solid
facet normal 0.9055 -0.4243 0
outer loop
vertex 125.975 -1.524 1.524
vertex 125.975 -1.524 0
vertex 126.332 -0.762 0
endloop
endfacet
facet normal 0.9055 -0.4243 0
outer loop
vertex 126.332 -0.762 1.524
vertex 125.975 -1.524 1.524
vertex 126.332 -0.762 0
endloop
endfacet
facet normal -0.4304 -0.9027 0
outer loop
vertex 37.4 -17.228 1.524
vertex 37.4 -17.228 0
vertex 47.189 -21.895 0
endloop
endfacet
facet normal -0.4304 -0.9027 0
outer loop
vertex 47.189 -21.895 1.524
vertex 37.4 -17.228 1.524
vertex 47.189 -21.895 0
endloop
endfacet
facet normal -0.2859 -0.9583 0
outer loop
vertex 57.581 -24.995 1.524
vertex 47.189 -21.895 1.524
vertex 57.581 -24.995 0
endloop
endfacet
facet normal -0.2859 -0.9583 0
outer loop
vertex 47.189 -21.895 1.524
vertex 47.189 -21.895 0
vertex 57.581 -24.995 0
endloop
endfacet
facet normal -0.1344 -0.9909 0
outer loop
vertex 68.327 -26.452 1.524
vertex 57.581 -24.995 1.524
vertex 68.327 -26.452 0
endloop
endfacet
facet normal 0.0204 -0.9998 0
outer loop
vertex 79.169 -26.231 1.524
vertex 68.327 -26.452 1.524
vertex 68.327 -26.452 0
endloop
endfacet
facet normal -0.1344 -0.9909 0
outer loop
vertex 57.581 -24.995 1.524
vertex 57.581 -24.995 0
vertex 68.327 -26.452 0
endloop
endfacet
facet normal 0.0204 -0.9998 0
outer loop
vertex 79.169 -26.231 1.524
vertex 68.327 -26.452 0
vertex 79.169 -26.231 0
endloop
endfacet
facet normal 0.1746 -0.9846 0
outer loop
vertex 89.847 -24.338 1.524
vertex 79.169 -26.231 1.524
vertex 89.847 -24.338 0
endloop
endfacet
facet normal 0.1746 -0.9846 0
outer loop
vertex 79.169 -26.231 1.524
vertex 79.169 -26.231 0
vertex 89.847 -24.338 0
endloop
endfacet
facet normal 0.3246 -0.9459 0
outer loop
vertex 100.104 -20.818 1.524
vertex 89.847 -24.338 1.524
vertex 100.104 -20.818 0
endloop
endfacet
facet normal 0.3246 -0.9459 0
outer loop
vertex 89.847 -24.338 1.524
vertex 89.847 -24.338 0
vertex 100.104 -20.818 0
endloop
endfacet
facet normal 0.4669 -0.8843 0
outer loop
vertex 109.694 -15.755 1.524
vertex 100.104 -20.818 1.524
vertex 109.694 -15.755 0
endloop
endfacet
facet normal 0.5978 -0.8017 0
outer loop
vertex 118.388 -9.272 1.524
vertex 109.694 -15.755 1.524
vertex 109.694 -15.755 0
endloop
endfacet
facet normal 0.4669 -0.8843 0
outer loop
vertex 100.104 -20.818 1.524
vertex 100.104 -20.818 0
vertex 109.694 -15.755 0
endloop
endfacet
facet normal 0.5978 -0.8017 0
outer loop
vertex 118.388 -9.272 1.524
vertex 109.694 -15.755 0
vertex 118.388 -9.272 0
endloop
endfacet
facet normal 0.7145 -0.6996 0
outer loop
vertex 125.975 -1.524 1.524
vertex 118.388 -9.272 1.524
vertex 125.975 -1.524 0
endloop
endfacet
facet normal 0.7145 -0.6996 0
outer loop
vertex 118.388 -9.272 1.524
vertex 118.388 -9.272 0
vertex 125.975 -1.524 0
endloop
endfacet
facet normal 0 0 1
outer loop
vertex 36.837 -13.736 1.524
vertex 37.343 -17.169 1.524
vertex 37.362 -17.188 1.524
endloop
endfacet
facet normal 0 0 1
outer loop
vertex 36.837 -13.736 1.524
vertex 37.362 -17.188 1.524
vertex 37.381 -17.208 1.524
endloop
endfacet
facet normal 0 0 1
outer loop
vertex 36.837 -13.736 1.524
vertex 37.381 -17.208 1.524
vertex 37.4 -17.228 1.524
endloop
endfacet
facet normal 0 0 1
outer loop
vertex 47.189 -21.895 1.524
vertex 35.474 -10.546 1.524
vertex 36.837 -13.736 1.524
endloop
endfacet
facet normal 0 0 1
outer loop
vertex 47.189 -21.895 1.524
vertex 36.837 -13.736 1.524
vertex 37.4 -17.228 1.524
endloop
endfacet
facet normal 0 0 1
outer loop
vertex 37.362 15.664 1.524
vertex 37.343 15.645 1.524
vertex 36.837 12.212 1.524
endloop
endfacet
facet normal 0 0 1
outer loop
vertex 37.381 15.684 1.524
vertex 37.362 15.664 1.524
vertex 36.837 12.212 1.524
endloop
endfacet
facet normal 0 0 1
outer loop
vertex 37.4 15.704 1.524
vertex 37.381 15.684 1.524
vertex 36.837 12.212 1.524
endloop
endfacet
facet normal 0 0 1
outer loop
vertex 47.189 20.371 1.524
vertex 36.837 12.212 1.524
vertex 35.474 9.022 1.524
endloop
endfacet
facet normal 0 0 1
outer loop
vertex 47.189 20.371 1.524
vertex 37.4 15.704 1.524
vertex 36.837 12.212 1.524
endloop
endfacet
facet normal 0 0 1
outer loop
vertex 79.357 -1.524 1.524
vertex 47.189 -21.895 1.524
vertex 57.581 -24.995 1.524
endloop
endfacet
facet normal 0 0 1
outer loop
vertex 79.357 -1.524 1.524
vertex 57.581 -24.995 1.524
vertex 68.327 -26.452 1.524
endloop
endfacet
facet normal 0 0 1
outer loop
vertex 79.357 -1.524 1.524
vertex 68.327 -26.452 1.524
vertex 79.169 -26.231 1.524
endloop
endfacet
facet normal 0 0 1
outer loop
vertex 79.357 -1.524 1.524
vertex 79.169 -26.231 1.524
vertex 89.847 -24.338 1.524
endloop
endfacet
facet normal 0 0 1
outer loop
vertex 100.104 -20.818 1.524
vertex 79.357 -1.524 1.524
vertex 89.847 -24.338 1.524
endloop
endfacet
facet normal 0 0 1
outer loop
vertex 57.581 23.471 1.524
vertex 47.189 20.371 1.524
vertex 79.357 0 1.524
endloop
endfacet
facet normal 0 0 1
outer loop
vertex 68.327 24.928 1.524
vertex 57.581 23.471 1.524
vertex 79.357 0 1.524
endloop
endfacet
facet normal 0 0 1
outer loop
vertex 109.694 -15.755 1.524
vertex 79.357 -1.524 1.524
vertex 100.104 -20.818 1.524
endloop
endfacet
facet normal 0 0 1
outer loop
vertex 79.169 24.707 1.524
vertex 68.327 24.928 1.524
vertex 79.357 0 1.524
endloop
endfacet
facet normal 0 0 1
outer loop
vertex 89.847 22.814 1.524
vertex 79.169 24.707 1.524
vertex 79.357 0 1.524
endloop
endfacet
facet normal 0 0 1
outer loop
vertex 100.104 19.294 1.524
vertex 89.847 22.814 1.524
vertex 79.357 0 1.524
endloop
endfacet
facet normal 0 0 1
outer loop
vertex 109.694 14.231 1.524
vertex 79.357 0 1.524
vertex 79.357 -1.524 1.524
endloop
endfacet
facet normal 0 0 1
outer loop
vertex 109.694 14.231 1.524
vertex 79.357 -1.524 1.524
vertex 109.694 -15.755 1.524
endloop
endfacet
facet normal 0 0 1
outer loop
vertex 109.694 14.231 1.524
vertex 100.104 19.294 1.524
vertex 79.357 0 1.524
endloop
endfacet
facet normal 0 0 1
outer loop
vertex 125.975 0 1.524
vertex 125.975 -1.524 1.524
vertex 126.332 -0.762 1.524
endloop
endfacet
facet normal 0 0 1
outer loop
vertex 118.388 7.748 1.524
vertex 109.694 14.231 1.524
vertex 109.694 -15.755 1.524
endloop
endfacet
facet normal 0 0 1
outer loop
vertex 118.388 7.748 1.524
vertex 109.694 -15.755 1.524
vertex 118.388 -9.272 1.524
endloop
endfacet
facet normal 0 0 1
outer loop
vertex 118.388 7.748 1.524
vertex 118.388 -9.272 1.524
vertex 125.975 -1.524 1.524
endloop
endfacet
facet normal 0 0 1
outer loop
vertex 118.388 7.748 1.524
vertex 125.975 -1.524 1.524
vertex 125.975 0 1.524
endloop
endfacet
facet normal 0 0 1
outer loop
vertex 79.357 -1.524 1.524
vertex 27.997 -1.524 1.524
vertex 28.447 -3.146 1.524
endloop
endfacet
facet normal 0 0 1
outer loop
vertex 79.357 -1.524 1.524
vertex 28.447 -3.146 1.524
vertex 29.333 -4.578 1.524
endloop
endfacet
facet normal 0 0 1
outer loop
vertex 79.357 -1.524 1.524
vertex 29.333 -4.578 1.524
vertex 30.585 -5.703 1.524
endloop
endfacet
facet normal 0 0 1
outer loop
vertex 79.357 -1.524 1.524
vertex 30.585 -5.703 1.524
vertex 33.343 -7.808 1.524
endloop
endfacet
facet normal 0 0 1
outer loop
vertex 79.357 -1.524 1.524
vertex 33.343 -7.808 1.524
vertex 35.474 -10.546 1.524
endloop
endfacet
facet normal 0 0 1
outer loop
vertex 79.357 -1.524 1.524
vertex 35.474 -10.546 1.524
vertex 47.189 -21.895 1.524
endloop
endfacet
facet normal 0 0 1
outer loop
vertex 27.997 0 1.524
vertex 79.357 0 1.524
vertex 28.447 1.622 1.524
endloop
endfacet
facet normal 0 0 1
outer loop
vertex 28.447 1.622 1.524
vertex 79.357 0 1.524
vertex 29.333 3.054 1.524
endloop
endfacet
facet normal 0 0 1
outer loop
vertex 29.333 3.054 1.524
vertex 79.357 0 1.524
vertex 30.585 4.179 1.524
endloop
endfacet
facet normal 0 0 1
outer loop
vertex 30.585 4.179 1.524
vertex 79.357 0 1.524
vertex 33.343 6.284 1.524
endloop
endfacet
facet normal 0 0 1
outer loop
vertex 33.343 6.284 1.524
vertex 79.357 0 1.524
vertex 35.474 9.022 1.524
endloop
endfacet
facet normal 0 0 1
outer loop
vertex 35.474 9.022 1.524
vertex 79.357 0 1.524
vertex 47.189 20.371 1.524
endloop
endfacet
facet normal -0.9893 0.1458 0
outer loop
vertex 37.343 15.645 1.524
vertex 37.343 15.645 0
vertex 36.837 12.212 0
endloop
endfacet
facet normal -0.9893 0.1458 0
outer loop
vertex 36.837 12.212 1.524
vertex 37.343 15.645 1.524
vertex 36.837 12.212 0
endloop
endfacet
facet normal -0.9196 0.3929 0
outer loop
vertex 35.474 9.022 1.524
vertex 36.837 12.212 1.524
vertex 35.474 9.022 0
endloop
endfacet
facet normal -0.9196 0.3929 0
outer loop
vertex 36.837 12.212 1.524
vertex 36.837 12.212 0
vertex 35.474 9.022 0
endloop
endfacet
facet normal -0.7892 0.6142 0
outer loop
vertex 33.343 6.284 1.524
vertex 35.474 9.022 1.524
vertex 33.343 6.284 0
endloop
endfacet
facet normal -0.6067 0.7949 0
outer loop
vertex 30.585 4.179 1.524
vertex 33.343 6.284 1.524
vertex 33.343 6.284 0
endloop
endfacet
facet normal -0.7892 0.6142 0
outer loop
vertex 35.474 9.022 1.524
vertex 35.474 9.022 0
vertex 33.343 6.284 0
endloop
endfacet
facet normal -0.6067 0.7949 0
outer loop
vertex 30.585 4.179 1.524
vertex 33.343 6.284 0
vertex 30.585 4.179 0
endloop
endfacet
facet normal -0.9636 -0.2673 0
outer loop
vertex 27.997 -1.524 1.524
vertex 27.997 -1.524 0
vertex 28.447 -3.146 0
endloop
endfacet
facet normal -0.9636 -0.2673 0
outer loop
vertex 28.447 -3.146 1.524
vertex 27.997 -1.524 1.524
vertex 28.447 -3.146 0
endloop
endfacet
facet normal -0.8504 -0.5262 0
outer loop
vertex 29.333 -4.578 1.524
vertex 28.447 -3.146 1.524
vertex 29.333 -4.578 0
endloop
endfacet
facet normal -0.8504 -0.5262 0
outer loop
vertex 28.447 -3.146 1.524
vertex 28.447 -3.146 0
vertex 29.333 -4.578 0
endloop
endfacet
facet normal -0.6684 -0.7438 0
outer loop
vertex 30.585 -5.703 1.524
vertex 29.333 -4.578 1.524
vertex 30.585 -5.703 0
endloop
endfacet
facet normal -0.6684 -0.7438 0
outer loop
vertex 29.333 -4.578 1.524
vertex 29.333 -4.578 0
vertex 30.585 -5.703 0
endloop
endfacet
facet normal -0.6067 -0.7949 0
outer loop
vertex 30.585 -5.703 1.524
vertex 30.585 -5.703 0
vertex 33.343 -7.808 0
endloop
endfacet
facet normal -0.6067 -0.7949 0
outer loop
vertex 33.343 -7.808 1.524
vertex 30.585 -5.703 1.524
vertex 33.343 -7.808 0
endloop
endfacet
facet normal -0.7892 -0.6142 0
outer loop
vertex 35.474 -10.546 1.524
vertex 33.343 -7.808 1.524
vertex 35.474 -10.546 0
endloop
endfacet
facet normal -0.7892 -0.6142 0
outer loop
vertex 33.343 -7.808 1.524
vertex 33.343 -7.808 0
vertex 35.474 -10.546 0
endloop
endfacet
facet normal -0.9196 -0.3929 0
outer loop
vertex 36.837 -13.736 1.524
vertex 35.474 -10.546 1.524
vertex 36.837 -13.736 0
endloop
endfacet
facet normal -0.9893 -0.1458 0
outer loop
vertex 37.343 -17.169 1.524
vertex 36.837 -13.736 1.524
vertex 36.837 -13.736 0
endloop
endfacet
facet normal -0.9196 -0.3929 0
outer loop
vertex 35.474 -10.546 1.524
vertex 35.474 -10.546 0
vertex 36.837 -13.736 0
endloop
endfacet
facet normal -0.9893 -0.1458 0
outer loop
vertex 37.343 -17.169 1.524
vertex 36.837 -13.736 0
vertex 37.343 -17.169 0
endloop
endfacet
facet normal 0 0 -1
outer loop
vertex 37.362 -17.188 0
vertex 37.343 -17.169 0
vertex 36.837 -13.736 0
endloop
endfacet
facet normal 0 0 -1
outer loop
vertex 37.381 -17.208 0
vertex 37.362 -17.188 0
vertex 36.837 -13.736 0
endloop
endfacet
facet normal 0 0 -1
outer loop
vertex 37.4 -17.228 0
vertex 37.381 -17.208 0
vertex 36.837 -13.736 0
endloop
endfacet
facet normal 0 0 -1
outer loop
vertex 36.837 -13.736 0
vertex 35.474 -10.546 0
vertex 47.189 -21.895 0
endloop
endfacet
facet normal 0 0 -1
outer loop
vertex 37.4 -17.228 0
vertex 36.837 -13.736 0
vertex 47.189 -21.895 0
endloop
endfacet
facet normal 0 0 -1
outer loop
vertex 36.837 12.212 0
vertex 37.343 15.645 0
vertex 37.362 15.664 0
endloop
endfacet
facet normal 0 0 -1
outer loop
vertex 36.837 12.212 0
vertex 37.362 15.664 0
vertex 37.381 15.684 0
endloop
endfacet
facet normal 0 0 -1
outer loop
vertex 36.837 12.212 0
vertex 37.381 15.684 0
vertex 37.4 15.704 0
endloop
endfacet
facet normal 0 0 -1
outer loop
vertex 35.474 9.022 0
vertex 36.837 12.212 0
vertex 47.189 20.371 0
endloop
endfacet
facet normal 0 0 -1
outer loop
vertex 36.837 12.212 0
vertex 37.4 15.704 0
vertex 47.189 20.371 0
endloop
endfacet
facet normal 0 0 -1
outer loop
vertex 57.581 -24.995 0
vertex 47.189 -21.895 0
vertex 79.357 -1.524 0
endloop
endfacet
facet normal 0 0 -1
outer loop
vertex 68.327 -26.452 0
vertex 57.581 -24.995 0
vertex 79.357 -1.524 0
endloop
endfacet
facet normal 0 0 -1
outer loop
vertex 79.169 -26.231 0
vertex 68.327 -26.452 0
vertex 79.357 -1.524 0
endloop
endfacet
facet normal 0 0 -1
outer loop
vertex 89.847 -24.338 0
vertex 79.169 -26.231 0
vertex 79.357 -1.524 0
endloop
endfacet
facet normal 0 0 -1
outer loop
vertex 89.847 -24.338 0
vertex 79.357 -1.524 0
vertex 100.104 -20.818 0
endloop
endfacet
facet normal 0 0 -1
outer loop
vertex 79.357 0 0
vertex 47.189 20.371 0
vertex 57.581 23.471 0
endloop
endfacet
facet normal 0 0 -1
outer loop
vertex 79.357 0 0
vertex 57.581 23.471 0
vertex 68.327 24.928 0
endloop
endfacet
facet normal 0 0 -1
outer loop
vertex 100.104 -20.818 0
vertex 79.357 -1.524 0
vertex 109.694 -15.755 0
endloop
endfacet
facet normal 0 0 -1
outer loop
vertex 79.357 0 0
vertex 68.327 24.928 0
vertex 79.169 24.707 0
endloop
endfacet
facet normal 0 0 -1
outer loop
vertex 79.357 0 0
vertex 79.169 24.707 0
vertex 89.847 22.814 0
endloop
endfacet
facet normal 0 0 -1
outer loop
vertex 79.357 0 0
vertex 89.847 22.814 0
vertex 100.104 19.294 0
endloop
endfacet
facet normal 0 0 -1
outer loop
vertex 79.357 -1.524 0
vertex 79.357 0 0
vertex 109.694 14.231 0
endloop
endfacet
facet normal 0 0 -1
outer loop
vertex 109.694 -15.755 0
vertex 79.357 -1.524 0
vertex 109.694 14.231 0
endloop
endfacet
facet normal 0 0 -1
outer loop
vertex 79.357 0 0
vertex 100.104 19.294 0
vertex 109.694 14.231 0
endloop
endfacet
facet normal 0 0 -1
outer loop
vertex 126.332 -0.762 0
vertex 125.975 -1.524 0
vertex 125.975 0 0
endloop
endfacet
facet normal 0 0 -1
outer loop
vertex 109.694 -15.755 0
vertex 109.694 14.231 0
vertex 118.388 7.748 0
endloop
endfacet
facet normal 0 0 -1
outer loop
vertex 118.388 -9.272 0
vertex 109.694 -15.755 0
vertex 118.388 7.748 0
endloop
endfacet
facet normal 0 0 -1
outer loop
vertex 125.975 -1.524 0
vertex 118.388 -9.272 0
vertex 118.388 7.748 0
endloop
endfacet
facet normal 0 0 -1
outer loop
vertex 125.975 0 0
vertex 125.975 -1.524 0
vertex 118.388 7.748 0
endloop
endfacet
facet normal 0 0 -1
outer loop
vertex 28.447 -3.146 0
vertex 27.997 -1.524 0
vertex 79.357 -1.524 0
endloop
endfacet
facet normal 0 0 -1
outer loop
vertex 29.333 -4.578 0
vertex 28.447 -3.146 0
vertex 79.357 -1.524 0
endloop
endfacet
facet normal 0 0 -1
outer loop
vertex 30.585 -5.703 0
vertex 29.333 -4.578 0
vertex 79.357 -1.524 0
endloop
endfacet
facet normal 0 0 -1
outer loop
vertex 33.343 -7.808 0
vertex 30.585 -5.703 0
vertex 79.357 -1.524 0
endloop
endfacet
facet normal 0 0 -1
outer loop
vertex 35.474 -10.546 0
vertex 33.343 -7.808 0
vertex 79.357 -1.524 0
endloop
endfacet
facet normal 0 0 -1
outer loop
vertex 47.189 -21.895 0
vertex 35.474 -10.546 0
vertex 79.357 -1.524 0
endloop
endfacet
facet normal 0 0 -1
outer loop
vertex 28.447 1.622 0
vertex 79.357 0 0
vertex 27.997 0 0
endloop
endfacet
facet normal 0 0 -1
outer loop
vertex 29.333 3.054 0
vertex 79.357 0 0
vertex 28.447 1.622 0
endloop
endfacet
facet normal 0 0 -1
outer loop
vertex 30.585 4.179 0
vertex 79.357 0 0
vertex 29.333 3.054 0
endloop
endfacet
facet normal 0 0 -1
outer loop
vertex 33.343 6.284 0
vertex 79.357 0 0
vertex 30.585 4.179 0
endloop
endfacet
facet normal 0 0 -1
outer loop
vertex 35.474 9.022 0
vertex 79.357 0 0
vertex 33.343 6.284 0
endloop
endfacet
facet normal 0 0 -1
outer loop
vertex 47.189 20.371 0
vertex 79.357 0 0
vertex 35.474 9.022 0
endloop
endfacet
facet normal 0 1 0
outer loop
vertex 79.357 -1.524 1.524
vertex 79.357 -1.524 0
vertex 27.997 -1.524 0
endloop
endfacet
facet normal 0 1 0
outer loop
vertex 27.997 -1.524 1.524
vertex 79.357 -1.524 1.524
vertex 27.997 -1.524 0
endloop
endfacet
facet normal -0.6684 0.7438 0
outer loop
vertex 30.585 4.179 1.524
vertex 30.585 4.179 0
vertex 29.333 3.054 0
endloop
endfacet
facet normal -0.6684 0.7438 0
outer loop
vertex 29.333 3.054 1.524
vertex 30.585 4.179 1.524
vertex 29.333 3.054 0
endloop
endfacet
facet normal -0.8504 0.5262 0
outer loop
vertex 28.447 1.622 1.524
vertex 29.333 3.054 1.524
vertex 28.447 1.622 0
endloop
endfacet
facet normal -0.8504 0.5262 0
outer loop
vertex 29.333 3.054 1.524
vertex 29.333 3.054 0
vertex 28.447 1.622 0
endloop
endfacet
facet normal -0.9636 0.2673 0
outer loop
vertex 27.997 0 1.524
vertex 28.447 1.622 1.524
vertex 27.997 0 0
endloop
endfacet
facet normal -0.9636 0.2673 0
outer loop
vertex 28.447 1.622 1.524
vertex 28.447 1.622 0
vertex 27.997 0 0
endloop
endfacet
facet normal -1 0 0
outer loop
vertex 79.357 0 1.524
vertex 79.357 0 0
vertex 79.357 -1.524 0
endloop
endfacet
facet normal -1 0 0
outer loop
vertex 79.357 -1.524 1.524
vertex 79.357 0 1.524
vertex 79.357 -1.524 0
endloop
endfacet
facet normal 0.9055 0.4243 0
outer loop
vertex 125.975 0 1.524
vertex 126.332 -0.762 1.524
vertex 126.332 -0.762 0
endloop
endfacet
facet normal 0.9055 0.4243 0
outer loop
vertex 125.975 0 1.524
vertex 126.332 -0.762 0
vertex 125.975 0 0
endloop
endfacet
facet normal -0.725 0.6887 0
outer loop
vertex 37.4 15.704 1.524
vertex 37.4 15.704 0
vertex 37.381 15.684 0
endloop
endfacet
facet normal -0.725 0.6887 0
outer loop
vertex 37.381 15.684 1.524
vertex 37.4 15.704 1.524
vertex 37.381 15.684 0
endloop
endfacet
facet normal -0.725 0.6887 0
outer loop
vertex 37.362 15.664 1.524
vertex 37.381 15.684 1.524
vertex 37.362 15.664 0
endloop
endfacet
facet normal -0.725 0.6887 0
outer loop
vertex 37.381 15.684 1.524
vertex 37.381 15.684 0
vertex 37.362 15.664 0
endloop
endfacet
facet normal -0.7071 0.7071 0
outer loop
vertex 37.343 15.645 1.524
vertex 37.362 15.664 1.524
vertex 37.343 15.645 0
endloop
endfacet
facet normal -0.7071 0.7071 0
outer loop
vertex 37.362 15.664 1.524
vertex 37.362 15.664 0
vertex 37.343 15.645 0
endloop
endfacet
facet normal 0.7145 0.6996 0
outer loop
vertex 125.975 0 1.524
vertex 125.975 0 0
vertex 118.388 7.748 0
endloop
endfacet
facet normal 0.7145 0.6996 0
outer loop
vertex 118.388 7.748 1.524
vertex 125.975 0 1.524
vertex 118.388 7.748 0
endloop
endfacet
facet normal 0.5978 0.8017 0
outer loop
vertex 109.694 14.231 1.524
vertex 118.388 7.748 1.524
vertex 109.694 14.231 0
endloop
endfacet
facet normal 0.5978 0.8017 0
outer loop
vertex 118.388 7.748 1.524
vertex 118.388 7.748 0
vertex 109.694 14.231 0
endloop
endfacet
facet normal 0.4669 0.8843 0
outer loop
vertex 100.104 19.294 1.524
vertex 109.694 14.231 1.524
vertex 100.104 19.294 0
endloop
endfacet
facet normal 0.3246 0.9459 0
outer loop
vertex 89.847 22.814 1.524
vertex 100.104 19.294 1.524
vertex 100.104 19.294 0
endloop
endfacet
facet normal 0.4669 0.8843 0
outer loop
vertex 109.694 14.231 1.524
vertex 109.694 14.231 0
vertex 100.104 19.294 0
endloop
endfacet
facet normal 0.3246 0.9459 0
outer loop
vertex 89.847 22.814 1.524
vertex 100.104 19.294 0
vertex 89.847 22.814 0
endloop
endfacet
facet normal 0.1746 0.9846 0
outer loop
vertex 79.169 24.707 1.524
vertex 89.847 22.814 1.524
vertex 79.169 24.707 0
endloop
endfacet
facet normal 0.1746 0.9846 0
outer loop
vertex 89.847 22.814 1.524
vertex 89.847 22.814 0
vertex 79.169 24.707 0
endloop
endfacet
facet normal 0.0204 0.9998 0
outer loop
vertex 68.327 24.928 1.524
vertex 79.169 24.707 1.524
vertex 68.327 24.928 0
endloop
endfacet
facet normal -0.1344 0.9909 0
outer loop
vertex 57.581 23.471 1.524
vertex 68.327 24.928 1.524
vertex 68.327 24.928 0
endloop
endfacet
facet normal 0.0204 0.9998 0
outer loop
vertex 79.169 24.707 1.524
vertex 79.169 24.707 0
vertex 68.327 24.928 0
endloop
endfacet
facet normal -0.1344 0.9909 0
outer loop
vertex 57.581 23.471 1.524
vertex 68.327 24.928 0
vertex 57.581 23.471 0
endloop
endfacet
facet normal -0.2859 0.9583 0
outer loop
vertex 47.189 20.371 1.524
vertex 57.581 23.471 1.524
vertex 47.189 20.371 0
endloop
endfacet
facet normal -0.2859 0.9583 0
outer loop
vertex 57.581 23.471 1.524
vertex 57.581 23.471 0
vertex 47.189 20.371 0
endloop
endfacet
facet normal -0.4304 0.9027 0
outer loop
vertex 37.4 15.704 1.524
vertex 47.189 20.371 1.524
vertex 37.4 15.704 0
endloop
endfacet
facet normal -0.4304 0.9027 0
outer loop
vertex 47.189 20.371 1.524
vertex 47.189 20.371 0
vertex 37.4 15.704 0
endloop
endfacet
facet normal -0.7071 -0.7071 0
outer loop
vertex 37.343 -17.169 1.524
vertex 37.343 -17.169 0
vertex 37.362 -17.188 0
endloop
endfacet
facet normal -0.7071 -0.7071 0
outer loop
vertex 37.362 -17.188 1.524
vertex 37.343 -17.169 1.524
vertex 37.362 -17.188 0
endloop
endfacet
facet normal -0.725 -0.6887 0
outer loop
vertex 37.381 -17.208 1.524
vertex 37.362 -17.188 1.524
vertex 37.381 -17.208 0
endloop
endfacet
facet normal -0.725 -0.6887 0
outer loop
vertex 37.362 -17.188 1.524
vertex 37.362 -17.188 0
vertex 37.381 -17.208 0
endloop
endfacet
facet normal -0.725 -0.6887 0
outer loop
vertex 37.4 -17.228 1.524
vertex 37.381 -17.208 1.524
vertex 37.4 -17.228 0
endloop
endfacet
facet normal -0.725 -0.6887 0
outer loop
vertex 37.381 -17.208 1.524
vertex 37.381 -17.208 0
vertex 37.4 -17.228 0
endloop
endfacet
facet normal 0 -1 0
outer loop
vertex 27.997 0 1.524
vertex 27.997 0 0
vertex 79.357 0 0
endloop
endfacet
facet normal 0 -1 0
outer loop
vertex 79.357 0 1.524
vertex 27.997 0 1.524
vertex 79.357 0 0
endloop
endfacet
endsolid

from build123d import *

# Parameters (mm, degrees)
BOSS_EXTRUDE1_DEPTH = 1.524


with BuildPart() as part:
    # Sketch1 → Boss-Extrude1 (new body)
    with BuildSketch(Plane.XY):
        with BuildLine():
            Line((79.357173925, 0), (79.357173925, -1.524))
            Line((79.357173925, -1.524), (27.997218561, -1.524))
            ThreePointArc((27.997218561, -1.524), (28.839303716, -3.893478834), (30.585272442, -5.703211014))
            ThreePointArc((30.585272442, -5.703211014), (35.473881568, -10.546204028), (37.343248984, -17.168782529))
            ThreePointArc((37.343248984, -17.168782529), (37.371863233, -17.198154529), (37.400490384, -17.227513955))
            ThreePointArc((37.400490384, -17.227513955), (84.54475886, -25.491518967), (125.974625666, -1.524))
            Line((125.974625666, -1.524), (126.331576391, -0.762))
            Line((126.331576391, -0.762), (125.974625666, 0))
            ThreePointArc((125.974625666, 0), (84.54475886, 23.967518967), (37.400490384, 15.703513955))
            ThreePointArc((37.400490384, 15.703513955), (37.371863233, 15.674154529), (37.343248984, 15.644782529))
            ThreePointArc((37.343248984, 15.644782529), (35.473881568, 9.022204028), (30.585272442, 4.179211014))
            ThreePointArc((30.585272442, 4.179211014), (28.839303716, 2.369478834), (27.997218561, 0))
            Line((27.997218561, 0), (79.357173925, 0))
        make_face()
    extrude(amount=BOSS_EXTRUDE1_DEPTH)


solid = part.part
